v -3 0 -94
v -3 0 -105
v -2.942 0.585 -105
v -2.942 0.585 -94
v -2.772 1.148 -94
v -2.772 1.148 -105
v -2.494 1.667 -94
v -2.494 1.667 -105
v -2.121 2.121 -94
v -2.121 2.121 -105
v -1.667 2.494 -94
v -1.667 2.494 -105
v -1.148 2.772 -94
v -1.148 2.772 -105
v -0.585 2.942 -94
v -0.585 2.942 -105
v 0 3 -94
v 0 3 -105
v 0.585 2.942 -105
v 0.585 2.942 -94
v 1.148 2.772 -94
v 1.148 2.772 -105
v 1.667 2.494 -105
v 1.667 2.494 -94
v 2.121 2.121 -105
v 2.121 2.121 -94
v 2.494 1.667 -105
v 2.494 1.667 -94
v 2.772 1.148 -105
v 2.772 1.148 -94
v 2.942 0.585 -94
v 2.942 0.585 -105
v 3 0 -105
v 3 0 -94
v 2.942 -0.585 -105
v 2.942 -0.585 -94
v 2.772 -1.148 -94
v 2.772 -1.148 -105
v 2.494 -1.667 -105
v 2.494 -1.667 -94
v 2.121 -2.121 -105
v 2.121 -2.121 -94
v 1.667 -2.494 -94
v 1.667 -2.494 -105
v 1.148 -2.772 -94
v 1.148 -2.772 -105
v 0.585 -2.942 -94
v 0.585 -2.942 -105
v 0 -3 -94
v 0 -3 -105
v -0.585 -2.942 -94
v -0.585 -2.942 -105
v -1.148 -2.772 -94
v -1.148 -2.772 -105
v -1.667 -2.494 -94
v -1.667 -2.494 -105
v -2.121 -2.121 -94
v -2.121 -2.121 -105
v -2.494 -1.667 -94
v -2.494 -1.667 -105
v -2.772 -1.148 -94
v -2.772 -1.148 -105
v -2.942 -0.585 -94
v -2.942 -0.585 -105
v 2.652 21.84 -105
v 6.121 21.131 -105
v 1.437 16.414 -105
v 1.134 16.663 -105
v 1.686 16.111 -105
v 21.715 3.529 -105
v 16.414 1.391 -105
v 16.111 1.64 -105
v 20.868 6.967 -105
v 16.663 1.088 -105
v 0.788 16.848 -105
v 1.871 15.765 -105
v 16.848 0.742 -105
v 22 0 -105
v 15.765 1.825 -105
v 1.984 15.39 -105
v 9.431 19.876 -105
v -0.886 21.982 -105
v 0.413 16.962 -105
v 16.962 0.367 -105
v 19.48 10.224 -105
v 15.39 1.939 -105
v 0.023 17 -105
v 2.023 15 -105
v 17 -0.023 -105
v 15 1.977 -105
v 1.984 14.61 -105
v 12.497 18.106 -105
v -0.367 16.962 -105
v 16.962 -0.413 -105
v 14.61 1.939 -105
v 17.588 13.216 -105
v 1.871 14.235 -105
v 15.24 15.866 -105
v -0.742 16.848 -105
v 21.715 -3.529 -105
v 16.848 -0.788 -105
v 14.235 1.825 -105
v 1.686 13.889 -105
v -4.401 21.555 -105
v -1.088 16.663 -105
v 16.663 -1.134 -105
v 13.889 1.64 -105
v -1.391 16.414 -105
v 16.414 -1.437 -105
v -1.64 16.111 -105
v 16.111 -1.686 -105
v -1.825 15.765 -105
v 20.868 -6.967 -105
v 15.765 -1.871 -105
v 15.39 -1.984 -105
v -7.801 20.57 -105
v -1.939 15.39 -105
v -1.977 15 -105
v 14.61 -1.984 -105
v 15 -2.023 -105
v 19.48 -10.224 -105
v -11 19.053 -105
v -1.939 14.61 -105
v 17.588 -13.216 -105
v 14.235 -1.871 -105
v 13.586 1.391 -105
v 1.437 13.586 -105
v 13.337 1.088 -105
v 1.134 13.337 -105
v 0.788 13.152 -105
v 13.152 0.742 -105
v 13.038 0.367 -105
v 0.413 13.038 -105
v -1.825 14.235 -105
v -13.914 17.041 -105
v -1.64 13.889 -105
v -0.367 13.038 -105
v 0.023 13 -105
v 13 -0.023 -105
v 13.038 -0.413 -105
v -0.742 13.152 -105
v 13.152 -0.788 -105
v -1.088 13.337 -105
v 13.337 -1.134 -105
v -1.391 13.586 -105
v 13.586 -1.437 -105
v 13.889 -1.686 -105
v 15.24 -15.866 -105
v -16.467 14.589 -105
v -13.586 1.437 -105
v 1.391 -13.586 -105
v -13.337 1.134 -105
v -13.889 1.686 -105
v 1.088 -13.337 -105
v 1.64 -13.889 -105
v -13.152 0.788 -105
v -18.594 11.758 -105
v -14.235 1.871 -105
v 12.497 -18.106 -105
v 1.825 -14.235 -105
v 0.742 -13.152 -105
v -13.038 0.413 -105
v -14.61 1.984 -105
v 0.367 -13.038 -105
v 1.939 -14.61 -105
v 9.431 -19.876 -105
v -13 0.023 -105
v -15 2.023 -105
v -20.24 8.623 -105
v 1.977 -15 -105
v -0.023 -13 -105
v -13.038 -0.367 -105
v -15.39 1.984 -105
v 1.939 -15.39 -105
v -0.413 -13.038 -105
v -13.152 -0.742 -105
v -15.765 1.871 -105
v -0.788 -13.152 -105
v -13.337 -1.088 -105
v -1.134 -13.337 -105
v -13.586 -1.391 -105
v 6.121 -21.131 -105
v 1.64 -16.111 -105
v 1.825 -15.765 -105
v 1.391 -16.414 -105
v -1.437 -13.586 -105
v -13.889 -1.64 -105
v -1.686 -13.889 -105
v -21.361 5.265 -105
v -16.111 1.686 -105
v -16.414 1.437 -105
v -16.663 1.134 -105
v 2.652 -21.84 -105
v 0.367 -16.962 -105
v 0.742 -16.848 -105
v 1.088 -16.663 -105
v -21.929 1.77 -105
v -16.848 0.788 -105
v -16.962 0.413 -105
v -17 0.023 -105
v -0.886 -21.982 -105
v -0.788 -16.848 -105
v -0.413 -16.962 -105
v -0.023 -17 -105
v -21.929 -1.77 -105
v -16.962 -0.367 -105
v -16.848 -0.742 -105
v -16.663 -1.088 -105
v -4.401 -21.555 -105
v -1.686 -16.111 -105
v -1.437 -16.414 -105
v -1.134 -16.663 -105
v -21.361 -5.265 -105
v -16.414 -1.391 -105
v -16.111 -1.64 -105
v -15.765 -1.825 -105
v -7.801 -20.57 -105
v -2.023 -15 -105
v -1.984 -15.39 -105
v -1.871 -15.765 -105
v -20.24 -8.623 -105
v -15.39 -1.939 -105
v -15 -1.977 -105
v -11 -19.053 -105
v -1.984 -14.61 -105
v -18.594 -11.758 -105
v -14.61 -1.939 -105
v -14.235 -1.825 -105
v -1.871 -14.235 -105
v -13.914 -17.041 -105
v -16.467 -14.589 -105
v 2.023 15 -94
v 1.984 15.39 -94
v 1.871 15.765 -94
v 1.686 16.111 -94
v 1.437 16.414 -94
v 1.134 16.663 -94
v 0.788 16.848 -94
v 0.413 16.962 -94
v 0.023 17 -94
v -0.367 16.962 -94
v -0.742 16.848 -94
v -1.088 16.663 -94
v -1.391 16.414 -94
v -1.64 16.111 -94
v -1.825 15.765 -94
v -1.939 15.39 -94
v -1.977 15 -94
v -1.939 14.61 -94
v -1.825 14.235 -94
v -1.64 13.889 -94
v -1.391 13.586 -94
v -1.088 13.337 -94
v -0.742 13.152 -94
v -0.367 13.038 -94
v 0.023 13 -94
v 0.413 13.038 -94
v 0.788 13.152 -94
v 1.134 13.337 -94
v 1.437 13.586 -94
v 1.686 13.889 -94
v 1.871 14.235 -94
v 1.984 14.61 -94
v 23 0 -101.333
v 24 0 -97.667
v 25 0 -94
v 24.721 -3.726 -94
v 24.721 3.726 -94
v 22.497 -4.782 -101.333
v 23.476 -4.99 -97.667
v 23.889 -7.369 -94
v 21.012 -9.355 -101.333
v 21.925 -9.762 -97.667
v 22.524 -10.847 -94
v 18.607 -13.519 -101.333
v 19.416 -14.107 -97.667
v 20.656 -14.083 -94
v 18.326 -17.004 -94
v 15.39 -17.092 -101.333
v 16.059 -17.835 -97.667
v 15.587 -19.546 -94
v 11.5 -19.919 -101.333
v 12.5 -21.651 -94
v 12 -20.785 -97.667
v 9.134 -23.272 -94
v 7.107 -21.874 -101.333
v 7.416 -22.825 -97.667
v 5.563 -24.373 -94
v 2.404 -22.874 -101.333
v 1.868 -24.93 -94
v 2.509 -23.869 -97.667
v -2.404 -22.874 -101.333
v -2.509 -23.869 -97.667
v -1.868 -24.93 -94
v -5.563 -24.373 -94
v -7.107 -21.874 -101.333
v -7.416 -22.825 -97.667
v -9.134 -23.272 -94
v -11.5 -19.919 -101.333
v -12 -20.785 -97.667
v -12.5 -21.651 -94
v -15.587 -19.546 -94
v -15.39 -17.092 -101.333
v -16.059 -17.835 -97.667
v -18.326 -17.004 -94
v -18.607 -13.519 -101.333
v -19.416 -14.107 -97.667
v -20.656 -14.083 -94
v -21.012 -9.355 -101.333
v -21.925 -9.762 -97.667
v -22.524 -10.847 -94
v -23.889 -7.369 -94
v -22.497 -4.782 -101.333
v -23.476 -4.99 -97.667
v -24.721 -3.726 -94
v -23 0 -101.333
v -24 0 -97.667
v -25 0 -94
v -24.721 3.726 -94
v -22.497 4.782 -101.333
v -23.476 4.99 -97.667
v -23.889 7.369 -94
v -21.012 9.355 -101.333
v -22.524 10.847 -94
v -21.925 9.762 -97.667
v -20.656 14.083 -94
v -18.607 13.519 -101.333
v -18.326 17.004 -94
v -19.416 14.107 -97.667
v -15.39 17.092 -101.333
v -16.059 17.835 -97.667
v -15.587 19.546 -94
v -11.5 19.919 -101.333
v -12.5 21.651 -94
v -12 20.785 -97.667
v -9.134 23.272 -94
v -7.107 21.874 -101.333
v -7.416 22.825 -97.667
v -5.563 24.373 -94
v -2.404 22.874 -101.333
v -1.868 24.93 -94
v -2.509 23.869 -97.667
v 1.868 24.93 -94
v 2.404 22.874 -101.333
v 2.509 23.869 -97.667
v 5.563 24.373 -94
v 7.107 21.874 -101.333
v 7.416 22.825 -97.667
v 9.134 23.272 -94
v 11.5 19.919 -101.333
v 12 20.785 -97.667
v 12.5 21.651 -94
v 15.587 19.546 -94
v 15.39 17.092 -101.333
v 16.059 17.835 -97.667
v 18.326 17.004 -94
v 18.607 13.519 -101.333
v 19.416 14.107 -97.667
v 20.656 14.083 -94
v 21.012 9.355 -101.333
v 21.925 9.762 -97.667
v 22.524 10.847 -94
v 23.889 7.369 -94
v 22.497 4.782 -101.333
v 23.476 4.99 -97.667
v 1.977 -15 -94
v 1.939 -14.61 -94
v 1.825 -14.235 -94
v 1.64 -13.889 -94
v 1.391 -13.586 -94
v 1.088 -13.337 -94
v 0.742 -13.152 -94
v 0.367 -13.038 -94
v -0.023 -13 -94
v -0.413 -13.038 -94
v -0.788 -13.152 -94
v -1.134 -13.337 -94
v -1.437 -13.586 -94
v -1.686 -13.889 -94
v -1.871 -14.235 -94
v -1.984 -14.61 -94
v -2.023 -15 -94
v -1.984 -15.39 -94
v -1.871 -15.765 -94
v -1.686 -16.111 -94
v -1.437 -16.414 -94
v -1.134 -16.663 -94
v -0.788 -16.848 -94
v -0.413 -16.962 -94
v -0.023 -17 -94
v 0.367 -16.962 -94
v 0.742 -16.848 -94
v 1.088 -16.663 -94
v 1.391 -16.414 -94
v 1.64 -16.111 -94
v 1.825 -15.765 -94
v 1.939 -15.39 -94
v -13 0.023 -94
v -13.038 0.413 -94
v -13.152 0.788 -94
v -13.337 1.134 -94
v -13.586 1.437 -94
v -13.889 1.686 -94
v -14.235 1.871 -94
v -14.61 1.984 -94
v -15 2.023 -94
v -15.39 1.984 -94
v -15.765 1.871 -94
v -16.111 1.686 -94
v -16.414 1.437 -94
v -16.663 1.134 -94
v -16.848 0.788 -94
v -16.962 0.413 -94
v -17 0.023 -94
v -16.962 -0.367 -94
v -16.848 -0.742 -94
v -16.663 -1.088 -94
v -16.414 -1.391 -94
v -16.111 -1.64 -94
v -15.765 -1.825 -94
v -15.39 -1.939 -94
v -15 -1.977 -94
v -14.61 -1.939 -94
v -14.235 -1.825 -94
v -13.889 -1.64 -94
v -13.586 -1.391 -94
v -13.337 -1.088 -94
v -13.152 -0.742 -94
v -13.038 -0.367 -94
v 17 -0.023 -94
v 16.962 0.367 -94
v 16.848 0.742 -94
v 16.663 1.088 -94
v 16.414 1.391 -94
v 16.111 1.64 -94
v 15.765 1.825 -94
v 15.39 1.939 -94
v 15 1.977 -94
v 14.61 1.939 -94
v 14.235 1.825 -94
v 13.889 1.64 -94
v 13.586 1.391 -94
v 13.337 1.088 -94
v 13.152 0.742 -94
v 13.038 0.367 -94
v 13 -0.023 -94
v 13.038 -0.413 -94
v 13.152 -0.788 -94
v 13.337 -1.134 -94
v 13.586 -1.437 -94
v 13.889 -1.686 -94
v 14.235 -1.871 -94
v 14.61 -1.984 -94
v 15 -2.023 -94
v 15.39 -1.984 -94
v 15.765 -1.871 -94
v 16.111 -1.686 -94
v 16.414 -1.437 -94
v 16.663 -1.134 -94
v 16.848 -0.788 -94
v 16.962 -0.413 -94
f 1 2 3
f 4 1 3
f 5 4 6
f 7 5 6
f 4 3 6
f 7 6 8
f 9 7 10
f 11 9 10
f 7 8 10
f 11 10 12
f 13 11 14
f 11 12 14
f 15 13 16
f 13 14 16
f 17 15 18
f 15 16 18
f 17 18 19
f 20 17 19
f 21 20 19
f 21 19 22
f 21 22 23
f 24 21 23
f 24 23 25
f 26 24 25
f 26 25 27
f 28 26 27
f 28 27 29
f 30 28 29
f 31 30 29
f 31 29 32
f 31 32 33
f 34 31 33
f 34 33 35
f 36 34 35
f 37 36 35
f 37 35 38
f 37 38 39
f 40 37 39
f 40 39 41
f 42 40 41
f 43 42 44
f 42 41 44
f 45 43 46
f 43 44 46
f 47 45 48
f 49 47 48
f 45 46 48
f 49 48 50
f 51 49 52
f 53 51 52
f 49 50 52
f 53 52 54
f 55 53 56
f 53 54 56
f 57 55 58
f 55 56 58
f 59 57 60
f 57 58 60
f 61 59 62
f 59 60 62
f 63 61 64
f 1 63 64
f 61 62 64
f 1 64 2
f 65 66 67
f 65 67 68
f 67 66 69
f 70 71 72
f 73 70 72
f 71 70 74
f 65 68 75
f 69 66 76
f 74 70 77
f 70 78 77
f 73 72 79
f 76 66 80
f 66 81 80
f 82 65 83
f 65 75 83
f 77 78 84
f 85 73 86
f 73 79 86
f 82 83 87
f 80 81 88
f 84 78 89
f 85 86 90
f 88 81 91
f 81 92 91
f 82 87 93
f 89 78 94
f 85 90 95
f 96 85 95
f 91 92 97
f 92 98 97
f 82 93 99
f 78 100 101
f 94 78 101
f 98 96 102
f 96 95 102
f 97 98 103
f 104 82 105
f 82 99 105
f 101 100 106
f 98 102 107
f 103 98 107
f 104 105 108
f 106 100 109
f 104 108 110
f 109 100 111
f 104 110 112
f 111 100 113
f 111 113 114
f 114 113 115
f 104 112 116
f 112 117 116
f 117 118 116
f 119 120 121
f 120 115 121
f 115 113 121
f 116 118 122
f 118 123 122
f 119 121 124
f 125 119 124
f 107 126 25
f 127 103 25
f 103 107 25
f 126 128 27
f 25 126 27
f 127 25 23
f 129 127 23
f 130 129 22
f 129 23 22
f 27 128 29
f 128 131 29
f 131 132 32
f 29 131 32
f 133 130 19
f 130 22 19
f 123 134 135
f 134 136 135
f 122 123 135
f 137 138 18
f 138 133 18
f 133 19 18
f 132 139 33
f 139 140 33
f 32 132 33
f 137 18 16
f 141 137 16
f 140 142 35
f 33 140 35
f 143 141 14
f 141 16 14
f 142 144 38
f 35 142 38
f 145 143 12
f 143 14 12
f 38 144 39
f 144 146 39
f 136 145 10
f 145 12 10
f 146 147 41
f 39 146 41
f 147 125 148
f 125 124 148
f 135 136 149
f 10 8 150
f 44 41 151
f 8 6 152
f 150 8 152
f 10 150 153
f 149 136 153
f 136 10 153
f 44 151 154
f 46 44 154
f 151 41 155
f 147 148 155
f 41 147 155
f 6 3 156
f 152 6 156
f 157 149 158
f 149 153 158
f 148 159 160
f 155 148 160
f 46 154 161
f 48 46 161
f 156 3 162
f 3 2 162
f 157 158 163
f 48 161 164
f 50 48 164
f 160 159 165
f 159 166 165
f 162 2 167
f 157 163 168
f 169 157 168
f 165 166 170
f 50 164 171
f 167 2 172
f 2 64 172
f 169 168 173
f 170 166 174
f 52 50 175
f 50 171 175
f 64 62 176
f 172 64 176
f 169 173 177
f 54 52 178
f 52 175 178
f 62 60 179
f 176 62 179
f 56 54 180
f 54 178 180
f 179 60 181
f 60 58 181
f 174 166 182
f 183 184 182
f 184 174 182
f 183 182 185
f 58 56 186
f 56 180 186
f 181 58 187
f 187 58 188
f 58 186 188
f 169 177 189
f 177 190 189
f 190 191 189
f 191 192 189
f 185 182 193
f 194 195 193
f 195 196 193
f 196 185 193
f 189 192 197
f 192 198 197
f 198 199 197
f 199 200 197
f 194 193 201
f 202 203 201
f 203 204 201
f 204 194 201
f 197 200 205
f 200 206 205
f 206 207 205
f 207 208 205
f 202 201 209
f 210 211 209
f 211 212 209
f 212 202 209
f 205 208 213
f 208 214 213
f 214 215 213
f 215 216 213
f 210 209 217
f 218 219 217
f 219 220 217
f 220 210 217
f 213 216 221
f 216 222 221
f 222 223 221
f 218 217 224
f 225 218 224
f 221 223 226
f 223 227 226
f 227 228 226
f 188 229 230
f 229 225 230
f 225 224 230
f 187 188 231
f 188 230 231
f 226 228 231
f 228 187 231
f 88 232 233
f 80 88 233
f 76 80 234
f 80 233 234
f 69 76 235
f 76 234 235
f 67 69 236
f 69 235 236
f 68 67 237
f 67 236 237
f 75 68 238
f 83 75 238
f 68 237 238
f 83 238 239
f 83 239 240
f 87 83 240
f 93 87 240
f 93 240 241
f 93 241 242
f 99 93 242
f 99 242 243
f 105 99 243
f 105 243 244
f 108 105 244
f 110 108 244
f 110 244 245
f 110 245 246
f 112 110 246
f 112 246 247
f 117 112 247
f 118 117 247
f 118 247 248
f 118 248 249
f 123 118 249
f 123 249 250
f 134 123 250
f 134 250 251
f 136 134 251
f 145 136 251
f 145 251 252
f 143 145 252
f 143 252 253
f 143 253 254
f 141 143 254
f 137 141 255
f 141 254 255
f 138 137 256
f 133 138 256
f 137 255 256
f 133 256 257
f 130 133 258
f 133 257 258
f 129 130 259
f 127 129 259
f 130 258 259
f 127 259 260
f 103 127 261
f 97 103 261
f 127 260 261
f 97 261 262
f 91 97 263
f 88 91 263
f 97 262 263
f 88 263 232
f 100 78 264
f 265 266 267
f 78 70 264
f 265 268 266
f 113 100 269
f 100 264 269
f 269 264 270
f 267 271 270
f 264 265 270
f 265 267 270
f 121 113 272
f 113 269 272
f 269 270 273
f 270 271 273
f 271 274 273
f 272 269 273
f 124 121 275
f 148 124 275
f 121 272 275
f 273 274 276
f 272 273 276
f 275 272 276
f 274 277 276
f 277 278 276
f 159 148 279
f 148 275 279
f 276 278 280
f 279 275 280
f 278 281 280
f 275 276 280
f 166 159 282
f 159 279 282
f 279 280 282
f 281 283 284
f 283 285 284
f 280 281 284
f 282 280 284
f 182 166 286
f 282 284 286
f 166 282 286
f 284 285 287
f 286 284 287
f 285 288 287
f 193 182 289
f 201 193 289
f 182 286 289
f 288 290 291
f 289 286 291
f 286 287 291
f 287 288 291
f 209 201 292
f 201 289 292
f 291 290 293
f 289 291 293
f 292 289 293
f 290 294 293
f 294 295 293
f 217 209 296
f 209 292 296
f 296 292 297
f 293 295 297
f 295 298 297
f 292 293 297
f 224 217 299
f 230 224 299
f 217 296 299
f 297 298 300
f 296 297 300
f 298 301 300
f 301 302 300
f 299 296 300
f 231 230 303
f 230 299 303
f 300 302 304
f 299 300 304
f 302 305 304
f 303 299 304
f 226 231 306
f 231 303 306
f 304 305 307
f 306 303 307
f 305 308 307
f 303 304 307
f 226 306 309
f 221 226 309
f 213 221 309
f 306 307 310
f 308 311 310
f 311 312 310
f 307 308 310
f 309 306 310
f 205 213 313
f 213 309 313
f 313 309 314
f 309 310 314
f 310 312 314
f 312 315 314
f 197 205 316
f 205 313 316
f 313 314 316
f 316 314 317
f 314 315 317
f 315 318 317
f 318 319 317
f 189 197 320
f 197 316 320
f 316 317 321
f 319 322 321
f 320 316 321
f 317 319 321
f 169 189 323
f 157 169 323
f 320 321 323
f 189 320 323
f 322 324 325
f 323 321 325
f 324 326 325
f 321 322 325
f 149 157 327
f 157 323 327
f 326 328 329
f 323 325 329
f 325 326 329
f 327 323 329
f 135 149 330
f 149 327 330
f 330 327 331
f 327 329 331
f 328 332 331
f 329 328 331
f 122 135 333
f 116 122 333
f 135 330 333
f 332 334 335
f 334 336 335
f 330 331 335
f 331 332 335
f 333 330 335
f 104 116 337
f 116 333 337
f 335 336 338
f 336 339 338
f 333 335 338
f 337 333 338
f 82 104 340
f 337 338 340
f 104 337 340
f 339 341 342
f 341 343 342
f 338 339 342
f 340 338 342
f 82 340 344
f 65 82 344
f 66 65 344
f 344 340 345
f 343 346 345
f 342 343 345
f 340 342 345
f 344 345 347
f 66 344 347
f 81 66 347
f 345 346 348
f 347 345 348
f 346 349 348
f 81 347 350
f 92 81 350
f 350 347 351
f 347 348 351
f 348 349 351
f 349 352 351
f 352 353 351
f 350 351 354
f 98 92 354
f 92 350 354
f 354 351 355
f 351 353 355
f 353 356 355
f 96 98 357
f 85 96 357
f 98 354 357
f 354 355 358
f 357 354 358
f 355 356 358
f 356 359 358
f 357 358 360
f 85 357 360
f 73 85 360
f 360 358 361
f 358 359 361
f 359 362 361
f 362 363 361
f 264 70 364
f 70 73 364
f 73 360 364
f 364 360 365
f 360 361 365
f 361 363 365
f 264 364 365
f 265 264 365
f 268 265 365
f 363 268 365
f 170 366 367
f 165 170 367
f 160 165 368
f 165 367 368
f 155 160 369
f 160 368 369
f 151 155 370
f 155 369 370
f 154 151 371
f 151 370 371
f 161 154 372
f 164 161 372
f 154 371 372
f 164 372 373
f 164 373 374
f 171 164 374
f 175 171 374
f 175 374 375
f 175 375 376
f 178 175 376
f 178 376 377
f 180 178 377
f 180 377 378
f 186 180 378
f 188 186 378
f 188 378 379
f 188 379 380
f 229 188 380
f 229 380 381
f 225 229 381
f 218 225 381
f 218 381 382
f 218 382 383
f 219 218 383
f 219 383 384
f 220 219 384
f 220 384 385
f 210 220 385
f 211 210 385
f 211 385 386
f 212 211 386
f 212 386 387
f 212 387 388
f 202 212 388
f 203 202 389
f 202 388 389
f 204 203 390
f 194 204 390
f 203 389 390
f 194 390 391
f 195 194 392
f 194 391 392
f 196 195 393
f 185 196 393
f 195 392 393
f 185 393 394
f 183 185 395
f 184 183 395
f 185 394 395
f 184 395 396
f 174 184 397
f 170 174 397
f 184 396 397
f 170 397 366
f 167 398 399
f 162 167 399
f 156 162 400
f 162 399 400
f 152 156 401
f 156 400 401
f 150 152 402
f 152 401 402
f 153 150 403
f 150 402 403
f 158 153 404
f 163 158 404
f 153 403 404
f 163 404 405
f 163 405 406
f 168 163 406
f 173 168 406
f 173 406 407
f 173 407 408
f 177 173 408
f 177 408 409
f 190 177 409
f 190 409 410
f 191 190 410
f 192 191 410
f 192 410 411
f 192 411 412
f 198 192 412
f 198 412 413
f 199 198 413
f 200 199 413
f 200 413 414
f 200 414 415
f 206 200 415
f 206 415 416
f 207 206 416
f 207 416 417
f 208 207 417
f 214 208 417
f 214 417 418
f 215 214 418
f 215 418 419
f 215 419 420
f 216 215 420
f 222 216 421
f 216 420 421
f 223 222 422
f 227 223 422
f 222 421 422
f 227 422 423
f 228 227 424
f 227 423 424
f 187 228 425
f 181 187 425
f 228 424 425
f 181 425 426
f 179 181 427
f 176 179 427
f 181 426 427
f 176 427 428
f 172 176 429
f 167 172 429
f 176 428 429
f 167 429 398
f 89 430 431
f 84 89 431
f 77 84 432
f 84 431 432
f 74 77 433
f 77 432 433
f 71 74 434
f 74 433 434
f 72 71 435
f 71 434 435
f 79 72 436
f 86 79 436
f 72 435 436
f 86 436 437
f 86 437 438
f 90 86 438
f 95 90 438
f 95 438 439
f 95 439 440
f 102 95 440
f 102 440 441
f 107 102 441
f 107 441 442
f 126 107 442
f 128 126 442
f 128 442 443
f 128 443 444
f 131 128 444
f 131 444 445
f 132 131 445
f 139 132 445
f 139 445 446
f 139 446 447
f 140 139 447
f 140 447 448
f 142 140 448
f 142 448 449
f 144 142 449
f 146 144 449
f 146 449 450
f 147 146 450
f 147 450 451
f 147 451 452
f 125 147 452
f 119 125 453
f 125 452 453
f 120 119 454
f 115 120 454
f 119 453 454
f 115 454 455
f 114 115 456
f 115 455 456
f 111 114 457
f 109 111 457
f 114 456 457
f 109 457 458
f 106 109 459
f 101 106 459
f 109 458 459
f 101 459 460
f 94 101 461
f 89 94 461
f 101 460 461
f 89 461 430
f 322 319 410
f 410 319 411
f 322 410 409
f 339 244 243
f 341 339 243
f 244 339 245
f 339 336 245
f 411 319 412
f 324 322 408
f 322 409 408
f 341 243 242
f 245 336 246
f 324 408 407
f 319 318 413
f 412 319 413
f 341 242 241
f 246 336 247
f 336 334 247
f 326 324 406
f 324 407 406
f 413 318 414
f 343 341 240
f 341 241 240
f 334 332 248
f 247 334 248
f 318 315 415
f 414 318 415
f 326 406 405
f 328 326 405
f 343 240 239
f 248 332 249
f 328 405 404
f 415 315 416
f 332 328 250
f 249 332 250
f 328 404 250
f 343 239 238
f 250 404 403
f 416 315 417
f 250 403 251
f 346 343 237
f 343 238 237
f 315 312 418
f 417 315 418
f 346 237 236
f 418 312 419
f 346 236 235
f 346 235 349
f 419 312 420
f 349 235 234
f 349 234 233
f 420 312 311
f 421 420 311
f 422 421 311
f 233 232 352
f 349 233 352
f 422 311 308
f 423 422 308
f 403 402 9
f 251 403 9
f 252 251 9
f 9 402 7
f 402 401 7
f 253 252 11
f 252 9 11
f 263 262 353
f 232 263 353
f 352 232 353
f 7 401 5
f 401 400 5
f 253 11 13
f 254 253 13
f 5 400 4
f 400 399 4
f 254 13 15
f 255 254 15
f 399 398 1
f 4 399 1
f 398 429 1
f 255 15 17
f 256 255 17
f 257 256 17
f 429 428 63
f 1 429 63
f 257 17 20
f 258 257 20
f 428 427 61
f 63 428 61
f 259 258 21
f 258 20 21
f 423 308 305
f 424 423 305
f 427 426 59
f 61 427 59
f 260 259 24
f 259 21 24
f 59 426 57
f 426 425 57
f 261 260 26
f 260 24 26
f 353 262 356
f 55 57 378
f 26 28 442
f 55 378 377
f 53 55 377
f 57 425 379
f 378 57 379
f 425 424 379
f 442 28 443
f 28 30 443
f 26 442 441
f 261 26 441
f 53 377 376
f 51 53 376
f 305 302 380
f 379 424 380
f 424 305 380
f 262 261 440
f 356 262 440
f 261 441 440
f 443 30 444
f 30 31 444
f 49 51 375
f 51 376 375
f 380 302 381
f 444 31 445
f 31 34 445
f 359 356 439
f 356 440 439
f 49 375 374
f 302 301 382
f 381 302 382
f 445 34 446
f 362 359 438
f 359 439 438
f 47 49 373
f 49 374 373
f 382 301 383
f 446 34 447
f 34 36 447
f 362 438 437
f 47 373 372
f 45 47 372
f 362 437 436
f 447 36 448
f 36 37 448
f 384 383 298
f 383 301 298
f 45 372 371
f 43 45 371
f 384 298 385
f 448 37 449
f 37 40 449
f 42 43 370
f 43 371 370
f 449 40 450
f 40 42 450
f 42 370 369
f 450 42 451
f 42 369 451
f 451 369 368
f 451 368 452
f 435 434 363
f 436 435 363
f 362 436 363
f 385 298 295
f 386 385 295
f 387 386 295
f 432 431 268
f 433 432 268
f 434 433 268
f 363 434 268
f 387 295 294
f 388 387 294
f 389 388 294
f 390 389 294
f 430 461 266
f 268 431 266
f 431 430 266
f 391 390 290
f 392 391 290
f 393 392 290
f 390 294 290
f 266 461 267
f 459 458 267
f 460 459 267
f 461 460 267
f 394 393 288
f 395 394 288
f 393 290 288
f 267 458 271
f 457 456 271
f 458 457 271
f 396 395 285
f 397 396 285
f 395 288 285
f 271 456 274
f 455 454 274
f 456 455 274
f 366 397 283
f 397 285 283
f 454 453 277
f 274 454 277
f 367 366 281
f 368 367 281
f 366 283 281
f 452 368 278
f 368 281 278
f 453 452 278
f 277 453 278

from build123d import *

# Parameters (mm, degrees)
F_4_0_4_DIAMETER_HOLE1_D     = 4
F_4_0_4_DIAMETER_HOLE1_DEPTH = 11
SKETCH4_R                    = 3
CUT_EXTRUDE1_DEPTH           = 12


with BuildPart() as part:
    # Sketch1 → Revolve1 (revolve)
    with BuildSketch(Plane.XZ):
        Polygon((25, -94), (0, -94), (0, -105), (22, -105), align=None)
    revolve(axis=Axis((0, 0, -94), (0, 0, -1)))

    # Ø4.0 (4) Diameter Hole1
    with Locations(Plane(origin=(0, 0, -105), x_dir=(-1, 0, 0), z_dir=(0, 0, -1))):
        with Locations((-14.999982566, -0.022869707), (0.022869707, -14.999982566), (-0.022869707, 14.999982566), (14.999982566, 0.022869707)):
            Hole(F_4_0_4_DIAMETER_HOLE1_D / 2, depth=F_4_0_4_DIAMETER_HOLE1_DEPTH)

    # Sketch4 → Cut-Extrude1 (cut, through all)
    with BuildSketch(Plane(origin=(0, 0, -105), x_dir=(-1, 0, 0), z_dir=(0, 0, -1))):
        Circle(SKETCH4_R)
    extrude(amount=-CUT_EXTRUDE1_DEPTH, mode=Mode.SUBTRACT)


solid = part.part
